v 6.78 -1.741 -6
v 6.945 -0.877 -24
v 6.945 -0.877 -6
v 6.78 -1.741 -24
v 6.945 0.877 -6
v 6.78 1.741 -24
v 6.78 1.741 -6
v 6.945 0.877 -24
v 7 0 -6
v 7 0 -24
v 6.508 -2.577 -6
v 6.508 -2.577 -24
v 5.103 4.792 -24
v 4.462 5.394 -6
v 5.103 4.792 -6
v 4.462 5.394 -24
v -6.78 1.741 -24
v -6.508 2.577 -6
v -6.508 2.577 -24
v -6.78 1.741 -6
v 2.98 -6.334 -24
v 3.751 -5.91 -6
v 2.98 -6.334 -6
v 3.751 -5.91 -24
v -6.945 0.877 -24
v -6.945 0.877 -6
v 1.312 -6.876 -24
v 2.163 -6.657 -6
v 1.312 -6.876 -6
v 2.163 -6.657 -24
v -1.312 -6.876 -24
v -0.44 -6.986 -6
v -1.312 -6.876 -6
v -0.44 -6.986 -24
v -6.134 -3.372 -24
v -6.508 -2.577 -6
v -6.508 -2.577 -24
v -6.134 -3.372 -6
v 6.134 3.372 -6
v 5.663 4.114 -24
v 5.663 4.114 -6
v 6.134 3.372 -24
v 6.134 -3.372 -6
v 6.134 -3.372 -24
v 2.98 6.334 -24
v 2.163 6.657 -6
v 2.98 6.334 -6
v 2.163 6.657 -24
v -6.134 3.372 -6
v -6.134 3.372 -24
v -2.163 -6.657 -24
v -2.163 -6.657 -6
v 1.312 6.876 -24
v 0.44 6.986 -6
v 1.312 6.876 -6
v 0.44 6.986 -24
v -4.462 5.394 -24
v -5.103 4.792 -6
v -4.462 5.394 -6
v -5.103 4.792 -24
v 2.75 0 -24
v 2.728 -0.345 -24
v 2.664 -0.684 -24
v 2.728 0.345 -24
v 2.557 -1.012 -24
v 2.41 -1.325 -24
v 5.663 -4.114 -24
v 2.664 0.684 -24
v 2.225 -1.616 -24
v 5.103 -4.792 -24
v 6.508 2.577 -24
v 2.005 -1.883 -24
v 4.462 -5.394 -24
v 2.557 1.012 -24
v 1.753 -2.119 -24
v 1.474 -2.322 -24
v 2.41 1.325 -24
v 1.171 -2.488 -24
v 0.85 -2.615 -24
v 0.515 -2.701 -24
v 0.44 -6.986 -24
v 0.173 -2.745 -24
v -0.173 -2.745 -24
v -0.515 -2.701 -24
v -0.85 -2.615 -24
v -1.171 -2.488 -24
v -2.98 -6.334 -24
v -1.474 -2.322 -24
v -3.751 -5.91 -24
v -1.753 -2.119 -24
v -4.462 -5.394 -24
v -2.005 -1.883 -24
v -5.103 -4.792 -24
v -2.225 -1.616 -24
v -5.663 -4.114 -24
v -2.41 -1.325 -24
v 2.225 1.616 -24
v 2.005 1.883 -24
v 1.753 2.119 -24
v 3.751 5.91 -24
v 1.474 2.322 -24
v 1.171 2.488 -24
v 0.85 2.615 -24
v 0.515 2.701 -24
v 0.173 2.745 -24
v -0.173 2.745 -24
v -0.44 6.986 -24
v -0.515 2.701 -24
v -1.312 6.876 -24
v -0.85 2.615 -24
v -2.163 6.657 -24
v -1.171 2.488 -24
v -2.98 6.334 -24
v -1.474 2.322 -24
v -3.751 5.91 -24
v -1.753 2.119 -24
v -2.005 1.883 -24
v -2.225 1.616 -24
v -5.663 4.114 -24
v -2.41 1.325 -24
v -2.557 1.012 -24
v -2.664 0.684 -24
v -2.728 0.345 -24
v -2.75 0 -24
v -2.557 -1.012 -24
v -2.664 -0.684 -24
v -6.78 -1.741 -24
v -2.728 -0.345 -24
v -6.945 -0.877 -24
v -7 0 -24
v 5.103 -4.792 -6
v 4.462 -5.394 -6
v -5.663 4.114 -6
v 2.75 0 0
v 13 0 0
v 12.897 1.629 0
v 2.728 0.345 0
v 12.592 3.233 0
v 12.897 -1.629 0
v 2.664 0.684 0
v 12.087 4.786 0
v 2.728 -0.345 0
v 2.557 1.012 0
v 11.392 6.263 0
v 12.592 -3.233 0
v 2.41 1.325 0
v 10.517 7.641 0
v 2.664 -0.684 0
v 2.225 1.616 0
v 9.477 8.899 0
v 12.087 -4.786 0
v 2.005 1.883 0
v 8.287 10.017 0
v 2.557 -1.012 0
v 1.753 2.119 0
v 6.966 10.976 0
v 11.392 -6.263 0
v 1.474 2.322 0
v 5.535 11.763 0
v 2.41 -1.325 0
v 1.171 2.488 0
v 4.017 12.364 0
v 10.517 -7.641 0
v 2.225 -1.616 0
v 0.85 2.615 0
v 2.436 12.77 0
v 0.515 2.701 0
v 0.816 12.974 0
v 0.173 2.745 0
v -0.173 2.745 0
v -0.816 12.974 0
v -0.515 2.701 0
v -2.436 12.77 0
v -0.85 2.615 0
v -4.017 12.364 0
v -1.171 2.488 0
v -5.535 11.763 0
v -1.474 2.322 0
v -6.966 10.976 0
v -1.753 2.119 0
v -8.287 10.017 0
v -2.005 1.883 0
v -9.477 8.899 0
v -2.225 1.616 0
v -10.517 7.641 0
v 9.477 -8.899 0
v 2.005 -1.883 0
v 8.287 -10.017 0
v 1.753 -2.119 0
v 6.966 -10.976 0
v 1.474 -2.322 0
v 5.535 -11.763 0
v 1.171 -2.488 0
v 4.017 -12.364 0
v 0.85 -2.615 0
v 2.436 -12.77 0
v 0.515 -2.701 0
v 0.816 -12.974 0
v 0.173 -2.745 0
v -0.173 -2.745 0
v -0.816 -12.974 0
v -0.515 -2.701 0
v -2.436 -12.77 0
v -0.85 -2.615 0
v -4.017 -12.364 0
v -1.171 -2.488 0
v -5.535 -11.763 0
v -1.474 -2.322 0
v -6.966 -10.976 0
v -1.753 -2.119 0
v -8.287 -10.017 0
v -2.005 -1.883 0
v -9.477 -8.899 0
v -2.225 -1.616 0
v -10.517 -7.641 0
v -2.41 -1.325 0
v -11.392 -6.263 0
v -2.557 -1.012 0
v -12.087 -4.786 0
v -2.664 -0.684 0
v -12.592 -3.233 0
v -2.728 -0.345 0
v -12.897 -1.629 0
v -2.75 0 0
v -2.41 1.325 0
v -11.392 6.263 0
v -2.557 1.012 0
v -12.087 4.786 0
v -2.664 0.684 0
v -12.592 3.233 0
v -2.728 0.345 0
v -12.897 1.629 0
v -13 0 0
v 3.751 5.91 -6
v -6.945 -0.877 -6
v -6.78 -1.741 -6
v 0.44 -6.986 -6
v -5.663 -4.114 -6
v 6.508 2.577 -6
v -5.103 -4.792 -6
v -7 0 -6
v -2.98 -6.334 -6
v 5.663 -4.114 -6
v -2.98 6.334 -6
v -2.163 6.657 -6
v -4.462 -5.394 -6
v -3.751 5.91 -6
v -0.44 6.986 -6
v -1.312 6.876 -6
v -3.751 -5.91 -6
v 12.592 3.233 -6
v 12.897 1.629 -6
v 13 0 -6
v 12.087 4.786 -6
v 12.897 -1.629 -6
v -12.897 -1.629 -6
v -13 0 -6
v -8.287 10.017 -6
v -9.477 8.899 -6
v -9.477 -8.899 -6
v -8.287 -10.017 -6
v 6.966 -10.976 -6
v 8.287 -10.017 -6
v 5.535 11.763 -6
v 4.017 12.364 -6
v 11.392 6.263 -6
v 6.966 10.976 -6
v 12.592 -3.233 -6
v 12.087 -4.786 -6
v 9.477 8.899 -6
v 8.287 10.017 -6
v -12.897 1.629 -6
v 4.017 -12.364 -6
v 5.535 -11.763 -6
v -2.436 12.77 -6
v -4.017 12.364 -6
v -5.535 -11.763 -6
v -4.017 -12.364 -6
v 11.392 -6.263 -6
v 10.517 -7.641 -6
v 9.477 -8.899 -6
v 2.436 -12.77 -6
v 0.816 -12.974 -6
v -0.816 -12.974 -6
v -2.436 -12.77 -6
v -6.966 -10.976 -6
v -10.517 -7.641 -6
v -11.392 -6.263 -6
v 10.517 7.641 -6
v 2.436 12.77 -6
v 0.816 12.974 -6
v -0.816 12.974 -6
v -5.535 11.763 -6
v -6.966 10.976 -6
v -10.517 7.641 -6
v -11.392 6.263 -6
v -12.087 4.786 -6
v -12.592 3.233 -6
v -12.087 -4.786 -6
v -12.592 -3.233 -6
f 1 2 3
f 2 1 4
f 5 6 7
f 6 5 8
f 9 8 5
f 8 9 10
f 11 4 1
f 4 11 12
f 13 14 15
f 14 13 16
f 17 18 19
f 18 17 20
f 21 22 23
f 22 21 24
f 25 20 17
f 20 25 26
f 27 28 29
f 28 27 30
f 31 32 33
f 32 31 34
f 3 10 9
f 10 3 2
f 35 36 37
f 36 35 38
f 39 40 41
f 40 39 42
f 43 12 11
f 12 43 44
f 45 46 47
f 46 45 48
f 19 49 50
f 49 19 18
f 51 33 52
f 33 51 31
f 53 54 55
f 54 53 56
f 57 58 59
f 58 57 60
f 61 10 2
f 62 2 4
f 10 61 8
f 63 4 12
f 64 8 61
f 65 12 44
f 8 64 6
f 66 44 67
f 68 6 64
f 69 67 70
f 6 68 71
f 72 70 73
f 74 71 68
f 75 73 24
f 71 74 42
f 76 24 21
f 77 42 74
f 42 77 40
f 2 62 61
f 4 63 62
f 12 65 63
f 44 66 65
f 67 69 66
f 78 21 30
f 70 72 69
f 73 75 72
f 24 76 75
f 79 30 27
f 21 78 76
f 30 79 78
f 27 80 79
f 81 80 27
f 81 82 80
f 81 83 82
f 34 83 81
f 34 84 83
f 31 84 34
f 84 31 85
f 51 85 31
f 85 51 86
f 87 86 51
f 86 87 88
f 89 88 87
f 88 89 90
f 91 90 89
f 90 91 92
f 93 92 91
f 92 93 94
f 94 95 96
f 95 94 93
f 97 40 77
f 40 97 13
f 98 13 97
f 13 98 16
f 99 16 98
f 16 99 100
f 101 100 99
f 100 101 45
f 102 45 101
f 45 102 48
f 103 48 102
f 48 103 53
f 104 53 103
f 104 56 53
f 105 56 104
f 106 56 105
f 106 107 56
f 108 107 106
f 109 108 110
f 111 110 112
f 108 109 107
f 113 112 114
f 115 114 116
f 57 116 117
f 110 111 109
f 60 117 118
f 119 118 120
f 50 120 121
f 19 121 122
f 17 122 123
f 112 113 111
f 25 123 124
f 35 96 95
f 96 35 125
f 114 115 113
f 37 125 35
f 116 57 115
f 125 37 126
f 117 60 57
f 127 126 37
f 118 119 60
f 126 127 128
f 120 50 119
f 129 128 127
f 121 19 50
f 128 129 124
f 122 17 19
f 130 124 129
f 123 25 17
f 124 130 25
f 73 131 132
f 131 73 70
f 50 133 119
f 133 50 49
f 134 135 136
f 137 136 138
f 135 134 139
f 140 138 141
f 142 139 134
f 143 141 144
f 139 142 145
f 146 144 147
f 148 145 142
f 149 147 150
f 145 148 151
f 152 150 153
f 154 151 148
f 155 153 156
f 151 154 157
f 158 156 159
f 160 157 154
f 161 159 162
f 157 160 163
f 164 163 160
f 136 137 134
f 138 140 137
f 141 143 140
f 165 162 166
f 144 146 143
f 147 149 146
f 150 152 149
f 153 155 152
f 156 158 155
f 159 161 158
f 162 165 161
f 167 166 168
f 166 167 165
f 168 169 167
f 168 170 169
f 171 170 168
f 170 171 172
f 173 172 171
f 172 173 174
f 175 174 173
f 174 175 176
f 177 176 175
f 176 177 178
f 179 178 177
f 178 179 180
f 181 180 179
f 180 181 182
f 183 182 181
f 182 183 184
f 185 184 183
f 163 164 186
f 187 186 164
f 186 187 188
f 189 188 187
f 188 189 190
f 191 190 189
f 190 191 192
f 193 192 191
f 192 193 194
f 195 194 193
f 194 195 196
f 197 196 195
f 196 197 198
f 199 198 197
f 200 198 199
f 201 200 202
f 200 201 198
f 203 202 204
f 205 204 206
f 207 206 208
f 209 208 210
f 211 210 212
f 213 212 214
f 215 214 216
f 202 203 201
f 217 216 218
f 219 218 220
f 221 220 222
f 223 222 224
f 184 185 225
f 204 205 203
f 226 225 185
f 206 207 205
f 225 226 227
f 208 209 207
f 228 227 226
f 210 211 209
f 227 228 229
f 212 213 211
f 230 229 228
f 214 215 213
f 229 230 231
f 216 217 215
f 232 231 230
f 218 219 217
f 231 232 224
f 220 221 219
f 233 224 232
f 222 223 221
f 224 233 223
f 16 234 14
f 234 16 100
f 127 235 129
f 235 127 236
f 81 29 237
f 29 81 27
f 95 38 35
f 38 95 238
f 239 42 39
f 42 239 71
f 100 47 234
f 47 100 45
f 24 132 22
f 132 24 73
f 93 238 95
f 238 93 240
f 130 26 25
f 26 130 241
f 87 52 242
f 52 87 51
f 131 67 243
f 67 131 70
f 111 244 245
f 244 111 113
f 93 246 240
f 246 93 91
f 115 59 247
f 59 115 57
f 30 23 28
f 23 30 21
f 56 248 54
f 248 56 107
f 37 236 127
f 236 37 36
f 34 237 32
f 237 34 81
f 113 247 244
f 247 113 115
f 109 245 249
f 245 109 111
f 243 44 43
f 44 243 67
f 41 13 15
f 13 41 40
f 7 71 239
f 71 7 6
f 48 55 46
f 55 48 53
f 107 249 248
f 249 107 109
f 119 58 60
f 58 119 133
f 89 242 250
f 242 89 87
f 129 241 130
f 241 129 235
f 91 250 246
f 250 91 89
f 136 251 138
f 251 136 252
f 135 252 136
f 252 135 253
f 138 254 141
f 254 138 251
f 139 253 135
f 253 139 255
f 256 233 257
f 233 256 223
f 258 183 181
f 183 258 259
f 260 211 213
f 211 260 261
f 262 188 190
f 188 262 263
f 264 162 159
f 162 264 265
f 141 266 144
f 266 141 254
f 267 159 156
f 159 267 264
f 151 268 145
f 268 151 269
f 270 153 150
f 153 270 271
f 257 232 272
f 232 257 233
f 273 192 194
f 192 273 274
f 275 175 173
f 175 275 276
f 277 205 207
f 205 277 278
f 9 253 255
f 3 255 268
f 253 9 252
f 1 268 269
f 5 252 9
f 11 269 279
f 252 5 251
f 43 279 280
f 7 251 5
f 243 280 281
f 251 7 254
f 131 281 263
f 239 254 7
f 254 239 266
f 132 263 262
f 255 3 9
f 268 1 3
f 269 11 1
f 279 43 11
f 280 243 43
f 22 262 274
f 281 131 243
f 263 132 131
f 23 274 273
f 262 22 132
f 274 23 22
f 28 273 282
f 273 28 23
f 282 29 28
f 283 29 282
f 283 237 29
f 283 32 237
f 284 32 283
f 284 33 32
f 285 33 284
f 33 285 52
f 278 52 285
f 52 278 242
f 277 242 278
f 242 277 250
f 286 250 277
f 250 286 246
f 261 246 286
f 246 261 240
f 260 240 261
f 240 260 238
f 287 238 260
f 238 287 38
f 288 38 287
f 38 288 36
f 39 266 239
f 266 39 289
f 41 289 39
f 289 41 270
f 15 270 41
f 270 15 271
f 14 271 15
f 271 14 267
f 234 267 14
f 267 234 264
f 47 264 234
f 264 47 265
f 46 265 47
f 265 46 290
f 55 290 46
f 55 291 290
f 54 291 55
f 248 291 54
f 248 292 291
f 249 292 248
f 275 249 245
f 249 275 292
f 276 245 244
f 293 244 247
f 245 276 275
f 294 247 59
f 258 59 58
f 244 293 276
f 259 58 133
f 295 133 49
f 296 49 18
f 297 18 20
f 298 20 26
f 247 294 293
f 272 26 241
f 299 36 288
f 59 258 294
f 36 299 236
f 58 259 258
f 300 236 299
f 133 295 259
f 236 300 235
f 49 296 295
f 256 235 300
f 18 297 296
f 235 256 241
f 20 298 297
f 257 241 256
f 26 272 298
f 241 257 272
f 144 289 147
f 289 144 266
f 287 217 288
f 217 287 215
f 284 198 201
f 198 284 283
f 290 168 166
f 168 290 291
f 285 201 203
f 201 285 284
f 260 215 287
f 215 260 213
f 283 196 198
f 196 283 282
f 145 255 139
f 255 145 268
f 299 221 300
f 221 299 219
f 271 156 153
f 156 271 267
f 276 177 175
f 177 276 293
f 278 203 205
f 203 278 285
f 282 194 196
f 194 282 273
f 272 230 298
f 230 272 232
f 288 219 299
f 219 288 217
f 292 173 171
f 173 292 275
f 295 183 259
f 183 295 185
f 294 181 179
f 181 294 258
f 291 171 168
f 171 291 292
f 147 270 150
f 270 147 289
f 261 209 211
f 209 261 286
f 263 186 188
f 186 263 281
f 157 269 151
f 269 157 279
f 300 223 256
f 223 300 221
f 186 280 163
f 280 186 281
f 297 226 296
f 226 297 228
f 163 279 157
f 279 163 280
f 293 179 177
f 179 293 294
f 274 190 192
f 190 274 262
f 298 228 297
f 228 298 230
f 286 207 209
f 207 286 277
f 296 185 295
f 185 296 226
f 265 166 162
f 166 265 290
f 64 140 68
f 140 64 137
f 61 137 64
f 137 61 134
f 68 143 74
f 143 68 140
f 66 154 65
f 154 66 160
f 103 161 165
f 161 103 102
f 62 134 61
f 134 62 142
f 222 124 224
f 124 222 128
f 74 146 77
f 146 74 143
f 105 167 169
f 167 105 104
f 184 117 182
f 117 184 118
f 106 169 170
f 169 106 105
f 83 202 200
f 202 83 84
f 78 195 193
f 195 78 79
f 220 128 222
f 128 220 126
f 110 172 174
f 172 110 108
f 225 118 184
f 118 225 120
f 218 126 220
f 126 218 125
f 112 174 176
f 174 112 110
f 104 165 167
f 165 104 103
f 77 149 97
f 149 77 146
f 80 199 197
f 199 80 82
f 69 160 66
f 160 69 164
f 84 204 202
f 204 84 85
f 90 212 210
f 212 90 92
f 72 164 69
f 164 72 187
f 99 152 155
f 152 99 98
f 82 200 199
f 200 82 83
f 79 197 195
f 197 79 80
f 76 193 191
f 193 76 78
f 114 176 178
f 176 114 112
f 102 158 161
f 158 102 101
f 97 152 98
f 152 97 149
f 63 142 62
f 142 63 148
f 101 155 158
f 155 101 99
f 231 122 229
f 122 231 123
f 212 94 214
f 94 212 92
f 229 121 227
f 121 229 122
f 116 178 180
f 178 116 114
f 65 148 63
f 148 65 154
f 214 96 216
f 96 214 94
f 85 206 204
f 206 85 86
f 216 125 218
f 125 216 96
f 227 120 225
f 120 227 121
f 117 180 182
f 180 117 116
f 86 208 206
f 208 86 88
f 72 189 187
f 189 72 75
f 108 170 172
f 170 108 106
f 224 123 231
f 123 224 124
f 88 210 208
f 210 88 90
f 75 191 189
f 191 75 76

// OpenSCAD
$fn = 50;


difference() {
	union() {
		translate(v = [0, 0, -24.0000000000]) {
			cylinder(h = 24, r = 7.0000000000);
		}
		translate(v = [0, 0, -6.0000000000]) {
			cylinder(h = 6, r = 13.0000000000);
		}
	}
	union() {
		#translate(v = [0, 0, -24]) {
			cylinder(h = 24, r = 2.7500000000);
		}
	}
}
